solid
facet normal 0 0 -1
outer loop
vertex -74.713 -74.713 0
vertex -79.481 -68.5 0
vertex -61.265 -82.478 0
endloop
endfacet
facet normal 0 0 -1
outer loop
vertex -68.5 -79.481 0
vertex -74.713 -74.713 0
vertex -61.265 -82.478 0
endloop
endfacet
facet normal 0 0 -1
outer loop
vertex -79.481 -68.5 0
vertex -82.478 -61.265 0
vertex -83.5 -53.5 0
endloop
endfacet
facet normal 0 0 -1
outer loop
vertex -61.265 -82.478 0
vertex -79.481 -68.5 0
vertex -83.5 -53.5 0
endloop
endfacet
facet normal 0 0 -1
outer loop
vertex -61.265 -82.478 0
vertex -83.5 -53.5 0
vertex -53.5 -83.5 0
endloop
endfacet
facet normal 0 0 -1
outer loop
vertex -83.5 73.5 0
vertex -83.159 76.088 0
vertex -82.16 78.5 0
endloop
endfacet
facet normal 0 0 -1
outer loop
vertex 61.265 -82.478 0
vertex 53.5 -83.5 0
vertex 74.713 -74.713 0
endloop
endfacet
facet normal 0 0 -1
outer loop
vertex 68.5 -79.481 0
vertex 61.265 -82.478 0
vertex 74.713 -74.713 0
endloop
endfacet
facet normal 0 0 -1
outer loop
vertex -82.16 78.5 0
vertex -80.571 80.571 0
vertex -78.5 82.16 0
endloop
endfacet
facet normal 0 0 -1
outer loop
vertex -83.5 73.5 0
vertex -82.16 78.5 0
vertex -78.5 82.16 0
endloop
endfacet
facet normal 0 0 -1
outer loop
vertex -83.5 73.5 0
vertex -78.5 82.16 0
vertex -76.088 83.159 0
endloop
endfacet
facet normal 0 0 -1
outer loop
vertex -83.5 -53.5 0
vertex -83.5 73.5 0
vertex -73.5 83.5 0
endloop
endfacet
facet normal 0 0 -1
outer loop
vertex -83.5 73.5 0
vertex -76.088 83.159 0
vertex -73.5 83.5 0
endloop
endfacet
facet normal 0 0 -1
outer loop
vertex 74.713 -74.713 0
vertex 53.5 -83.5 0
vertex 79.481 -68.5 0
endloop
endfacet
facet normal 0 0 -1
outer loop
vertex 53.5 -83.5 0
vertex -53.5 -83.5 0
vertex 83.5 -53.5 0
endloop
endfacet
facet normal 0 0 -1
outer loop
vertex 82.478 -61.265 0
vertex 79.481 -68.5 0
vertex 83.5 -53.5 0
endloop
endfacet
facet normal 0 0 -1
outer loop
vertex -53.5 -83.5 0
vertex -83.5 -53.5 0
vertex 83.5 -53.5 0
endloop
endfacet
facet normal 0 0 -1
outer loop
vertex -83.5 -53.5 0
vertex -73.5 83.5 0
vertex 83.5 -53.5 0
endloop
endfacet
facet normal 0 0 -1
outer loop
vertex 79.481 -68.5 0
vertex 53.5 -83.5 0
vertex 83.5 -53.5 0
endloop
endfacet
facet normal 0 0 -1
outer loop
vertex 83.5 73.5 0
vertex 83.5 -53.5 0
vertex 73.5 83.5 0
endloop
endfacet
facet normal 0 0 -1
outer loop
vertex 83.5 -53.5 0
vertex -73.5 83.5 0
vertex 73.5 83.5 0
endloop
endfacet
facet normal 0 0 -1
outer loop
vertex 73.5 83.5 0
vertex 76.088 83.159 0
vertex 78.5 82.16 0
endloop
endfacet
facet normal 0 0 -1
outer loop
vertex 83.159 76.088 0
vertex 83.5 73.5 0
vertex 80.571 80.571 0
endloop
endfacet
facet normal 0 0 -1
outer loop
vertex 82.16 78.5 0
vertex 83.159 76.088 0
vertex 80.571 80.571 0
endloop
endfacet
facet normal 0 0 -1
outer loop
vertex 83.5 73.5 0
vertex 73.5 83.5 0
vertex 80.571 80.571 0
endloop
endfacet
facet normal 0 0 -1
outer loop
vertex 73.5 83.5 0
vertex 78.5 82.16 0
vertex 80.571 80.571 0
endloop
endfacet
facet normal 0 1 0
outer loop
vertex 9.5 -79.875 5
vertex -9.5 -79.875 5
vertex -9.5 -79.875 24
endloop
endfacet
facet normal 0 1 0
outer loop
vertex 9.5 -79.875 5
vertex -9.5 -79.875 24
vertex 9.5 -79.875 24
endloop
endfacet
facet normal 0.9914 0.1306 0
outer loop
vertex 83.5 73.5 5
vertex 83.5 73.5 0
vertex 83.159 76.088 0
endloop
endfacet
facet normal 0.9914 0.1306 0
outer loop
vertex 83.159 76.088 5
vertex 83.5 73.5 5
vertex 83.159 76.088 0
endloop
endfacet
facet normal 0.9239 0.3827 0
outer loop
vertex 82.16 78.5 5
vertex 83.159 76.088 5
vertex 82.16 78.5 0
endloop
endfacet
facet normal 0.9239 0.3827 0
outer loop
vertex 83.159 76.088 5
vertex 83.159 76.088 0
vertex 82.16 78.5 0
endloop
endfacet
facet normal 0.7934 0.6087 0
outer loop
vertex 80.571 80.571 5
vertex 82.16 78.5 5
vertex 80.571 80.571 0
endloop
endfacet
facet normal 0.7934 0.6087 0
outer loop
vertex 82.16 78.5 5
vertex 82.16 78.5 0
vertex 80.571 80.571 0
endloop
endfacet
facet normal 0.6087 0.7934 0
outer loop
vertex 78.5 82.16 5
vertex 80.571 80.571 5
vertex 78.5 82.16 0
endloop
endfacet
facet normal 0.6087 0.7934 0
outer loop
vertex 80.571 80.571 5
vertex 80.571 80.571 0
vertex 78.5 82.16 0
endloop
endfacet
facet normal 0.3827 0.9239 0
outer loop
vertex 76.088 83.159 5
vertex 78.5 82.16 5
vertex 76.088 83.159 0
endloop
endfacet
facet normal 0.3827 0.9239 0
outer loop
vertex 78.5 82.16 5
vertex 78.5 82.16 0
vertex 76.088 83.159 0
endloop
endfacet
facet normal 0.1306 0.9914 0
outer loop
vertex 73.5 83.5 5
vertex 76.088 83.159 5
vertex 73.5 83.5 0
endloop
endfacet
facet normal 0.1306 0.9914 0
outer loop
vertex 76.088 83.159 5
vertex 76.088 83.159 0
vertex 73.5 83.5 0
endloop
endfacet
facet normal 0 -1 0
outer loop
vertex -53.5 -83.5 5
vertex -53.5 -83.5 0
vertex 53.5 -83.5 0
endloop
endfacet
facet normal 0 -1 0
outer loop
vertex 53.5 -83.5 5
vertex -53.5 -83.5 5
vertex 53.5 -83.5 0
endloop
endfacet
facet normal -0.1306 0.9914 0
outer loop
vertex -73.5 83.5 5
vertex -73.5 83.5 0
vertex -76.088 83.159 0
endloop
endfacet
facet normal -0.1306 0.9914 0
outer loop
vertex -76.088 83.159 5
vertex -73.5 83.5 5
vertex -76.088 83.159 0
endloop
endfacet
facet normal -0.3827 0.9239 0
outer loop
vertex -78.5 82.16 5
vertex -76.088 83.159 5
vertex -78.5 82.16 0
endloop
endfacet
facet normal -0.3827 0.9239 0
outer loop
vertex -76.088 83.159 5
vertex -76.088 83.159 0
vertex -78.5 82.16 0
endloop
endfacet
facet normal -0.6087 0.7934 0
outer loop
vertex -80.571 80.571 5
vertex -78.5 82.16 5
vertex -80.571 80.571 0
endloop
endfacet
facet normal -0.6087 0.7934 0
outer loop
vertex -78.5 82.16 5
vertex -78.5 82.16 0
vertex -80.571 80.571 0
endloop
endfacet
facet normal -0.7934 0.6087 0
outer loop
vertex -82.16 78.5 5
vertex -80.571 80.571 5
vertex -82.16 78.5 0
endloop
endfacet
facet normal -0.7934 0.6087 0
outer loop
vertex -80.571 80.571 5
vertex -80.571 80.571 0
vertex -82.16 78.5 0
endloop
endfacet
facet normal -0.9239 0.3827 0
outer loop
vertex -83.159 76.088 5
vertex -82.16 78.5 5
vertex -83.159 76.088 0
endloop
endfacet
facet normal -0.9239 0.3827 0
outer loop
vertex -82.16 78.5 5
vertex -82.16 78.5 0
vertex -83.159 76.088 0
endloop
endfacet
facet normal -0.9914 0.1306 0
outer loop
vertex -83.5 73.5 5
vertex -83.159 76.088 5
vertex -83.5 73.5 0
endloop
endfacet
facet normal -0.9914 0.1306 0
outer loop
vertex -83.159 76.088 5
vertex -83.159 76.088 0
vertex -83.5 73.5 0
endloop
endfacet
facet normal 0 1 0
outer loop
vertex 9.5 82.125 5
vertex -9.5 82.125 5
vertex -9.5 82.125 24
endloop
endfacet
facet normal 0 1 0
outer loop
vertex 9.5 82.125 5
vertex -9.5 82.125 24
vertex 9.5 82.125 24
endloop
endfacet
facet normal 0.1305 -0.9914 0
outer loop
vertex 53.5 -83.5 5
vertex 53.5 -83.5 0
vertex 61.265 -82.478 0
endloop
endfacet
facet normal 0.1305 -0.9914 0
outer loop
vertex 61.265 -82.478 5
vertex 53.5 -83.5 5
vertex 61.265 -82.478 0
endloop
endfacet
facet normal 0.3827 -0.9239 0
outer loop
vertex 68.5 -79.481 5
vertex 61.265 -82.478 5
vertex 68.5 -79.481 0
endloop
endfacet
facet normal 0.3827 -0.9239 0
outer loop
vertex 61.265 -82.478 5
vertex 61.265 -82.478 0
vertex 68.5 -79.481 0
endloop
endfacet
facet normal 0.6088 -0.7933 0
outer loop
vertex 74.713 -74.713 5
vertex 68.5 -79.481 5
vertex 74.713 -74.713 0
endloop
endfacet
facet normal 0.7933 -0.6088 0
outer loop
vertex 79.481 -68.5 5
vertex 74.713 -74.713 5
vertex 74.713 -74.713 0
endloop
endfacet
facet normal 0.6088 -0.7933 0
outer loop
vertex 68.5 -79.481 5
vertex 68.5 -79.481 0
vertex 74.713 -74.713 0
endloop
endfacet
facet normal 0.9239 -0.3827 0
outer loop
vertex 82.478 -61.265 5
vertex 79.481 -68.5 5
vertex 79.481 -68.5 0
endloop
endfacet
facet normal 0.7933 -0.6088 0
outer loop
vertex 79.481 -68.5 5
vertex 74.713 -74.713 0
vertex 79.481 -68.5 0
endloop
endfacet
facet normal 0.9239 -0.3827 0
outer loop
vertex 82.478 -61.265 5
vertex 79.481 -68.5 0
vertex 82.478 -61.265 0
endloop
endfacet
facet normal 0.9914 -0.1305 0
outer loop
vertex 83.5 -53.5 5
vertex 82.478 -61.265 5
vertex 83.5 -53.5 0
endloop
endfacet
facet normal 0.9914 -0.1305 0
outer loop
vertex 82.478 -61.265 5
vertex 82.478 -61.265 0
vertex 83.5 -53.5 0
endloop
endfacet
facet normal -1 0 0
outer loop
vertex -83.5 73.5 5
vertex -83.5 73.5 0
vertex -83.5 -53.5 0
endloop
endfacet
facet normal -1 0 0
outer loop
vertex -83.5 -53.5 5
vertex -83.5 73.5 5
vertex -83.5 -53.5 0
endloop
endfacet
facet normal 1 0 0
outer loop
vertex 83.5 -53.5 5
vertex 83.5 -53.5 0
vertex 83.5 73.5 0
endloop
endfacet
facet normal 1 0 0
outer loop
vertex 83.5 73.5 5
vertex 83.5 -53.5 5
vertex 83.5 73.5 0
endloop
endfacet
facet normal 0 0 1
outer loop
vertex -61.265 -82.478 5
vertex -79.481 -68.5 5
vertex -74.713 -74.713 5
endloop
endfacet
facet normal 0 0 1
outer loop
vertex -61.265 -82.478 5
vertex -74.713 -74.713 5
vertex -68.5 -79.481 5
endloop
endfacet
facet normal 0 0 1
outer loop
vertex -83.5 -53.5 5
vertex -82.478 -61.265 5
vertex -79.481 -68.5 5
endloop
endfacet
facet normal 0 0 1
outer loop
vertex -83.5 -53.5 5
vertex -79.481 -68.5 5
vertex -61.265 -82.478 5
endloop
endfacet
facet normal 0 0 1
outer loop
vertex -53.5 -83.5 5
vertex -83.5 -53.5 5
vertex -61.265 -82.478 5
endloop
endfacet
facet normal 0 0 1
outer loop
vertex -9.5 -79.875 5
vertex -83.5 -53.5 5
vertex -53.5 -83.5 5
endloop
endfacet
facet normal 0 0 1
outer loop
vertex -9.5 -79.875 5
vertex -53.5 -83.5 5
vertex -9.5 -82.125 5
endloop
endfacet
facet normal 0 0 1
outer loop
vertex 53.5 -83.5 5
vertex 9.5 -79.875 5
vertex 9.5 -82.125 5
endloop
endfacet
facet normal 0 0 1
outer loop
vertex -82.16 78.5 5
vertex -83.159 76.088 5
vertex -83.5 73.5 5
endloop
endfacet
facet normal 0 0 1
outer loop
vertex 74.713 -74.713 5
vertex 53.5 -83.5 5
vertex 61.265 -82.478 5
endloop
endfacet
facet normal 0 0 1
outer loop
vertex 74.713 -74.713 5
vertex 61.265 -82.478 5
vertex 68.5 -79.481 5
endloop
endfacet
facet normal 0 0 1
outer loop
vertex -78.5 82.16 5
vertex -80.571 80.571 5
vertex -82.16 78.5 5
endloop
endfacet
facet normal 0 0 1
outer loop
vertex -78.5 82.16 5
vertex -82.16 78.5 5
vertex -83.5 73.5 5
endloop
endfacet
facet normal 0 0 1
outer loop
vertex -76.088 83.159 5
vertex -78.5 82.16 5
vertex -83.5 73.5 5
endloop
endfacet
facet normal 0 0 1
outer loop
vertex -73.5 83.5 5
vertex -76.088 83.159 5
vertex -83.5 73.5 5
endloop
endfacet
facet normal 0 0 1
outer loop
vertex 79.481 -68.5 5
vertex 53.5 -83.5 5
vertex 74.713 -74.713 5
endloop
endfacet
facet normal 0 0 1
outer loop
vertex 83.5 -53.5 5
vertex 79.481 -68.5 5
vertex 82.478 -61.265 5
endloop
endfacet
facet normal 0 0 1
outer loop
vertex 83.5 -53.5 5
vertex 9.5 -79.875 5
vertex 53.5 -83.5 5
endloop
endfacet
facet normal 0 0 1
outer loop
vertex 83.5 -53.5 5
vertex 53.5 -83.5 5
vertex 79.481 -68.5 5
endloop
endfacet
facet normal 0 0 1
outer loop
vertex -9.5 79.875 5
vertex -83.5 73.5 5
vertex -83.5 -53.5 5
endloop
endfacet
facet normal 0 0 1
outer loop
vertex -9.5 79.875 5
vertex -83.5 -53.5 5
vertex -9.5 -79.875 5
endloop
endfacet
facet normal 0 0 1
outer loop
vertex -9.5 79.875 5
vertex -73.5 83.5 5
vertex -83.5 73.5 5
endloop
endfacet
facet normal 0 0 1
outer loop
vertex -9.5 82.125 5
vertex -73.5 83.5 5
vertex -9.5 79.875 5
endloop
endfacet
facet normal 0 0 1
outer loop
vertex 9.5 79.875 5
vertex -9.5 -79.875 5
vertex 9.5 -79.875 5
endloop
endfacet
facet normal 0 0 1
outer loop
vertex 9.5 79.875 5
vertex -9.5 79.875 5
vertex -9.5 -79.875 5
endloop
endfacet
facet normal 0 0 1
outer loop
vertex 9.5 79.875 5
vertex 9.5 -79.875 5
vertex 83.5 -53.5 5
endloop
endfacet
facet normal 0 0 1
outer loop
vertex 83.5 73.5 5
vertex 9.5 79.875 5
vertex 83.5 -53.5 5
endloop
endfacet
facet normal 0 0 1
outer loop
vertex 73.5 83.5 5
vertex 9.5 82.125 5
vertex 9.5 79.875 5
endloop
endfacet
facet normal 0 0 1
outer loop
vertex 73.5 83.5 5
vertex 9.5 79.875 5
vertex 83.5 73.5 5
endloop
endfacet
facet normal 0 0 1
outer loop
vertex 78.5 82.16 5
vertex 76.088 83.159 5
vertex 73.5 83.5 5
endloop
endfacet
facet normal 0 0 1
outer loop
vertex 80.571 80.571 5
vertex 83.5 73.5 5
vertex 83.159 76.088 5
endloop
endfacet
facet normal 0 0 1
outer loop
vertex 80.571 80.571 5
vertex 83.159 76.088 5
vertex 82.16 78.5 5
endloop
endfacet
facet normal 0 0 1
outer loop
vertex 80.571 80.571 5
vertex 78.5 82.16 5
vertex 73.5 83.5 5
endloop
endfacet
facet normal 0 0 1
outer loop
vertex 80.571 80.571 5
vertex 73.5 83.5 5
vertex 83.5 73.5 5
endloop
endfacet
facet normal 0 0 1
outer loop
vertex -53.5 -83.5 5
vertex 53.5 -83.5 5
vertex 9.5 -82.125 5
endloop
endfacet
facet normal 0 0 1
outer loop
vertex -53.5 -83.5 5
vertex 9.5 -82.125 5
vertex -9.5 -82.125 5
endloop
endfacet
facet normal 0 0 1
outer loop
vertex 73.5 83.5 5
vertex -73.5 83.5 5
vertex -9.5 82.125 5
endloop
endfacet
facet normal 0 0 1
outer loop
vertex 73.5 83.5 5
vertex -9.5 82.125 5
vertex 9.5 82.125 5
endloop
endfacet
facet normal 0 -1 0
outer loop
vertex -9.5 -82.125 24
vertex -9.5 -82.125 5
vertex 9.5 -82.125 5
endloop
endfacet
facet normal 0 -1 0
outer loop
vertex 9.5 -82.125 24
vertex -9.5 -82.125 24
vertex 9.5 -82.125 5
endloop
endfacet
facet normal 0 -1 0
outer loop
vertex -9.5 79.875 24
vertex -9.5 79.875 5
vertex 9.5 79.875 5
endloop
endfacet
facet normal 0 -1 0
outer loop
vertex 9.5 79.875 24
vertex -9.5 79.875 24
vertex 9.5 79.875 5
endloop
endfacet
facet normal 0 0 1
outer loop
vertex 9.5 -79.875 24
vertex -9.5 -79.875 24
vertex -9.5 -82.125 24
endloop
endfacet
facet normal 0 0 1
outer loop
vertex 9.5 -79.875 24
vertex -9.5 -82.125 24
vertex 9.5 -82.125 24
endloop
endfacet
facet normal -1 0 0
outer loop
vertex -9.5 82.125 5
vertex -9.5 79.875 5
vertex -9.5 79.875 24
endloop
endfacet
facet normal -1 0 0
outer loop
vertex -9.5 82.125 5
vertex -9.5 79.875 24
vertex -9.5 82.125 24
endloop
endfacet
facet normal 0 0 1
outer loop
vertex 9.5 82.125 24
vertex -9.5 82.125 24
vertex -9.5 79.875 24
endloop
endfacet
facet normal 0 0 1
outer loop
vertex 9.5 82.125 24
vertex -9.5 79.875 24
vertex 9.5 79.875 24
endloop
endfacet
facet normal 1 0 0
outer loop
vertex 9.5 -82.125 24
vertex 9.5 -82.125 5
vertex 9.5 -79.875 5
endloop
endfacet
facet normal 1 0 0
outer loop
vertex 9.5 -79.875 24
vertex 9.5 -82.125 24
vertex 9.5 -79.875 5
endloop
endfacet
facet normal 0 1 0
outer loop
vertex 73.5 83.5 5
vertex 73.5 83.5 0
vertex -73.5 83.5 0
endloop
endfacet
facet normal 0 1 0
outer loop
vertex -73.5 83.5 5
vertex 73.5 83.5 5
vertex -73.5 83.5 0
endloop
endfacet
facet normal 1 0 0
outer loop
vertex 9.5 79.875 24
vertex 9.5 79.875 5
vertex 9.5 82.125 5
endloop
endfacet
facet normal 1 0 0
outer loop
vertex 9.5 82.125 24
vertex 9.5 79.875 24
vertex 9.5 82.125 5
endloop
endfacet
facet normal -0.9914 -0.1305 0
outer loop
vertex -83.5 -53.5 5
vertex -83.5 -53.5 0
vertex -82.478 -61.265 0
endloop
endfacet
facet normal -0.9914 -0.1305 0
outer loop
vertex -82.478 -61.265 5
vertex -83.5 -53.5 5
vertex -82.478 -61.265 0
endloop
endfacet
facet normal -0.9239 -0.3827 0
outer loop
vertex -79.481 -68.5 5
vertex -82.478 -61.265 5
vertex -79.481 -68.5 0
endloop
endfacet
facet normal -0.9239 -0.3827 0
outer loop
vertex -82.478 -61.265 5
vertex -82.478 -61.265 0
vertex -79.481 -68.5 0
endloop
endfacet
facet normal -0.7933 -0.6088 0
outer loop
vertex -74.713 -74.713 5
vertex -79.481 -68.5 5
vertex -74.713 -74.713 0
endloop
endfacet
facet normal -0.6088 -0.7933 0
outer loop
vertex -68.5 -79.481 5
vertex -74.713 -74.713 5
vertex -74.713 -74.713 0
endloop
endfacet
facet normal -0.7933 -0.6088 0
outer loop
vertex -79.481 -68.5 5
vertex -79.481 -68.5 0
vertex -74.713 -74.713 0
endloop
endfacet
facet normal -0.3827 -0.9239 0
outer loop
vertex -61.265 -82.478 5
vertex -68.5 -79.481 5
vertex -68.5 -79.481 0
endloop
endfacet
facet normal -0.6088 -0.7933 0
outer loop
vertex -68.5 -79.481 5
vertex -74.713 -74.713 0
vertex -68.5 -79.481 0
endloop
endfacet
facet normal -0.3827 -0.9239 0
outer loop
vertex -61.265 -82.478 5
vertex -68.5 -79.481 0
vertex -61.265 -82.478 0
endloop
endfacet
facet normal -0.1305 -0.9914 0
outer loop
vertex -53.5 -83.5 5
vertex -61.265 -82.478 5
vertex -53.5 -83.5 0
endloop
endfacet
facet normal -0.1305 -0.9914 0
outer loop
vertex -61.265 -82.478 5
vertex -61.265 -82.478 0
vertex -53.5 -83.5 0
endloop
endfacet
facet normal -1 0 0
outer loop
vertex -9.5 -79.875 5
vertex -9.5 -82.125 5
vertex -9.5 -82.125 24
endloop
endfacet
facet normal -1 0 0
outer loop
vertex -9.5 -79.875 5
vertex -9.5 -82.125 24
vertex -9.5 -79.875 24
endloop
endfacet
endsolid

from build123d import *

# Parameters (mm, degrees)
F1_DEPTH = 5
F2_W     = 19
F2_H     = 2.25
F3_DEPTH = 19
F4_W     = 19
F4_H     = 2.25
F5_DEPTH = 19


with BuildPart() as f1:
    # F0 (on Top) → F1 (new body)
    with BuildSketch(Plane.XY):
        with BuildLine():
            Line((-53.5, -83.5), (53.5, -83.5))
            ThreePointArc((53.5, -83.5), (74.713203, -74.713203), (83.5, -53.5))
            Line((83.5, -53.5), (83.5, 73.5))
            ThreePointArc((83.5, 73.5), (80.571068, 80.571068), (73.5, 83.5))
            Line((73.5, 83.5), (-73.5, 83.5))
            ThreePointArc((-73.5, 83.5), (-80.571068, 80.571068), (-83.5, 73.5))
            Line((-83.5, 73.5), (-83.5, -53.5))
            ThreePointArc((-83.5, -53.5), (-74.713203, -74.713203), (-53.5, -83.5))
        make_face()
    extrude(amount=F1_DEPTH)

    # F2 (on face) → F3 (join)
    with BuildSketch(Plane.XY.offset(5)):
        with Locations((0, -81)):
            Rectangle(F2_W, F2_H)
    extrude(amount=F3_DEPTH)

    # F4 (on face) → F5 (join)
    with BuildSketch(Plane.XY.offset(5)):
        with Locations((0, 81)):
            Rectangle(F4_W, F4_H)
    extrude(amount=F5_DEPTH)


solid = f1.part
